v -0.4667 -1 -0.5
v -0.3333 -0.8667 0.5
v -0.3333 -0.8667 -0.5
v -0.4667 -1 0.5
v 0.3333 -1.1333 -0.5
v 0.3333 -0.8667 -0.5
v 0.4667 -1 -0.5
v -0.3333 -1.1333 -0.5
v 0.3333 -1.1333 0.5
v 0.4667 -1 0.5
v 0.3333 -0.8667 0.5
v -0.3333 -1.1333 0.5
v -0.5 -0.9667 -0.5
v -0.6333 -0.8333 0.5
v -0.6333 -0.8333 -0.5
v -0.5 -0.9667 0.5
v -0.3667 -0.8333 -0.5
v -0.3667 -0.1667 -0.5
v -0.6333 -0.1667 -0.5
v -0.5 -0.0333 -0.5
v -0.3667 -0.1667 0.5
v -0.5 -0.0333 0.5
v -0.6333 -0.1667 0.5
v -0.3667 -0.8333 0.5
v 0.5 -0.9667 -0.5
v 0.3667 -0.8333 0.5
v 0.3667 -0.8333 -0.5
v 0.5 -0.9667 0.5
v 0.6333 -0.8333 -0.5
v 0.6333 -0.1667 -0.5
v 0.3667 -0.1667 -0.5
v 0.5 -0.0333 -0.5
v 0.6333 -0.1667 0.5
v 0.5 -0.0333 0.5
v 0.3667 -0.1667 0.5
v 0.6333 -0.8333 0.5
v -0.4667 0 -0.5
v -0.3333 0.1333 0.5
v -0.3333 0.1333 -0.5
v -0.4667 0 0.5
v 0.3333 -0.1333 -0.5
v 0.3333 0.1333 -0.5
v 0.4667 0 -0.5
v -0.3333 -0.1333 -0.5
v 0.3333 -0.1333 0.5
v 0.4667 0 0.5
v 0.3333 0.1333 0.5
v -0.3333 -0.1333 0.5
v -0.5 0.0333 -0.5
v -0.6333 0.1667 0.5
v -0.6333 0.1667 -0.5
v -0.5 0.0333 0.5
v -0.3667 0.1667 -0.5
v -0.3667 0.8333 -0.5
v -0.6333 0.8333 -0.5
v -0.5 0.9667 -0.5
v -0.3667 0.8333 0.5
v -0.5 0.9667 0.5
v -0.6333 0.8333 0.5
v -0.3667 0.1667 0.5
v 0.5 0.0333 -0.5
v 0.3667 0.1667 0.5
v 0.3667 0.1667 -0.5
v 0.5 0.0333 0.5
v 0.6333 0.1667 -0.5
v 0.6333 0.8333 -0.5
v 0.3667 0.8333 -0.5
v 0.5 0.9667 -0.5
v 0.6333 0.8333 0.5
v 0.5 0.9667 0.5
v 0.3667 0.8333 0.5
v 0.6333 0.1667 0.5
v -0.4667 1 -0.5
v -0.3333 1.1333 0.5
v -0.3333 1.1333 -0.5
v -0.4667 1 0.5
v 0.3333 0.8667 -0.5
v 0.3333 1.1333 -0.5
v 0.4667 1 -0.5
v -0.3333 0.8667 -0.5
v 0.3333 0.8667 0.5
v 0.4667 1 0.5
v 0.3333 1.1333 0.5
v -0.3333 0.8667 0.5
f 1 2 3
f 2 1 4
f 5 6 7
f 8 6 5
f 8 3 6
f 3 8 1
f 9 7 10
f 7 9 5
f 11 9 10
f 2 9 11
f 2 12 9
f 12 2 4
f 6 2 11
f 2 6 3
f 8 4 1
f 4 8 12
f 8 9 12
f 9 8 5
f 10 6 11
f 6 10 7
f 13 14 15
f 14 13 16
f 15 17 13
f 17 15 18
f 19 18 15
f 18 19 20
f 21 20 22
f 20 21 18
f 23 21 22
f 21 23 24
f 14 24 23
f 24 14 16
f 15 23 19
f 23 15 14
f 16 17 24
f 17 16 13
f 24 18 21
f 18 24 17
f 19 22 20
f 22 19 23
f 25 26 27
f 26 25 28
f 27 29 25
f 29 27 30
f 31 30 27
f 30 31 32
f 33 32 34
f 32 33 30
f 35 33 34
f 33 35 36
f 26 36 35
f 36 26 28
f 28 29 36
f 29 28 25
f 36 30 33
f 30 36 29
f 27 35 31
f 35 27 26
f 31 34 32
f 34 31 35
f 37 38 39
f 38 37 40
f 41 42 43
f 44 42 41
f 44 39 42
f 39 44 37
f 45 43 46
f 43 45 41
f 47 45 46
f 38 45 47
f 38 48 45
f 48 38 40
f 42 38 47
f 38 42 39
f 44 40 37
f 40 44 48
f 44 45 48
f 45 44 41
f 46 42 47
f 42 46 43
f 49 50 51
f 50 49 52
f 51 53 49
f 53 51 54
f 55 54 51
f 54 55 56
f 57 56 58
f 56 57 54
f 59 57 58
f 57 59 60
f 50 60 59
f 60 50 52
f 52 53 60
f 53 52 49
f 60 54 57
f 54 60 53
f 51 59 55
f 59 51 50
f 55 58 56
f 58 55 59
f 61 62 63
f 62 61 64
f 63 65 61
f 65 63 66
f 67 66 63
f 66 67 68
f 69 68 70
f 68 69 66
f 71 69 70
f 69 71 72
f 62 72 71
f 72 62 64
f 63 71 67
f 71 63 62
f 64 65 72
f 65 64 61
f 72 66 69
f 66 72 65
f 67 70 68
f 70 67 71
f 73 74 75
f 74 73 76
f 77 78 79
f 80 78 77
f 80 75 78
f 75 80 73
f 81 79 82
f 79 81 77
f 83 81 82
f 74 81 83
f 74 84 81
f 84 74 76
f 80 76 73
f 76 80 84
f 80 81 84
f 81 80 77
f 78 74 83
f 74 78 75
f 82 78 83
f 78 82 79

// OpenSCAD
// file: bitops.scad
function bit(p) = pow(2,(p));
function _BTEST(x, abit) = x % (abit+abit) >= abit;
function BTEST(x, abit) = _BTEST(x, bit(abit));

function BIT(x, abit=0) = x % (bit(abit)+bit(abit)); 


//echo("5 :", BTEST(5,2), BTEST(5,1), BTEST(5,0));
//echo("5 :", BIT(5,2), BIT(5,1), BIT(5,0));

//=================================
// Bit manipulation
//=================================

function getdigit(x, pos=1) = floor(fract(x/pow(10,pos))*10);

function fract(x) = x - floor(x); 

function LSHIFT(x, pos=1, base=2) = x*pow(base,pos); 
function RSHIFT(x, pos=1, base=2) = floor(x/pow(base, pos));
function RSHIFTPART(x, pos=1, base=2) = x % pow(base, pos);
function lowbit(x, base=2) = x - LSHIFT(RSHIFT(x, base=base), base=base);

function BIT(x, pos=0, base=2) = lowbit(RSHIFT(x, pos,base), base=base);
//function BTEST(x, pos=0, base=2) = BIT(x,pos,base)>0;
// file: SegmentedNumber.scad
/*
	This module creates seven segment display digits
*/

include <bitops.scad>


joinfactor = 0.01;
gap = 0.4;
digitwidth = 1;
digitdepth = 2;
scalar = 30;


/*
	segment

	An array of 2D coordinates which define the Outline
	for a single segment of the seven segement display.

	This single segment is laid out horizontally, and is
	centered around the origin.
*/
// Outline of a single segment

segment =[ 
	[-14/scalar, 0], 
	[-10/scalar, -4/scalar], 
	[10/scalar, -4/scalar], 
	[14/scalar, 0], 
	[10/scalar, 4/scalar], 
	[-10/scalar, 4/scalar]];

/*
	seglocs

	An array of translations and rotations which places
	each segment in the proper place in the seven segment
	display.


*/
// Take the template of a segment, and give appropriate
// translations and rotations to put it in place to form a number.
// for each segment there is a tuple:
// [trans], rot
// [trans] is a triplet that indicates the translation
// rot - is the angle of rotation around the z-axis

seglocs = [
	[[0,-1.0,0], 0],
	[[-0.5,-0.5,0],90],
	[[0.5,-0.5,0],90],
	[[0,0,0],0],
	[[-0.5,0.5,0],90],
	[[0.5,0.5,0],90],
	[[0,1.0,0],0]
];

/*
Digit Information

The seven segments of the display (left), 
each have the number indicated (right)
	 __			6
	|  |	4		5
	 --			3
	|  |	1		2
	 --			0

 A single 8-bit number is used to indicate which
 segments are active for any single digit.  If a bit
 is set, then that particular segment is active.
*/

DigitSegments = [
			119,	// 0	0111 0111
			36,		// 1	0010 0100
			107,	// 2	0110 1011
			109,	// 3	0110 1101
			60,		// 4	0011 1100
			93,		// 5
			95,		// 6
			100,	// 7
			127,	// 8
			125		// 9
			];


function value(astr)=search(astr,"0123456789")[0]; 

/*
	DisplayDigit

	Display a single digit
	iNumber - the single digit to Display
	height - how tall to make it, default to '1'
*/

module DisplayDigit(iNumber, height = 1)
{        
    for (iSeg = [0:6])
	{
		if (BTEST(DigitSegments[iNumber],iSeg))
        {
			linear_extrude(height=height, center=true) {
				translate(seglocs[iSeg][0])
				rotate(seglocs[iSeg][1])
				polygon(points = segment, paths = [[0,1,2,3,4,5]]);
			}
        }
	}
}

module DisplayNumber(number, height=1)
{
	digitstr = str(number);
	count = len(digitstr);
	echo("len: ", count);

	for (counter = [0:count-1])
	{
		digitchar = digitstr[counter];
		digitvalue = value(digitchar);
		
		echo(digitchar, " ", digitvalue);
		translate([(counter)*(digitwidth+gap),0,0])
		DisplayDigit(digitvalue, height);
	}
}

module RenderNumberPlate(number, thickness=1, height=1)
{
	digitstr = str(number);
	count = len(digitstr);
	platewidth = count*(digitwidth+gap)+2*gap;
	platedepth = digitdepth+2*gap;

	DisplayNumber(number, height);

	// Display the plate
	color([0.2, 0.7, 0.3])
	translate([-digitwidth/2-gap*2, -digitdepth/2-gap, -thickness-height/2+joinfactor])
	cube(size=[platewidth, platedepth, thickness]);
}
// main file
include <SegmentedNumber.scad>

//scale([25, 25, 10])
//DisplayDigit(0);
//DisplayDigit(1);
//DisplayDigit(2);
//DisplayDigit(3);
//DisplayDigit(4);
//DisplayDigit(5);
//DisplayDigit(6);
//DisplayDigit(7);
DisplayDigit(8);
//DisplayDigit(9);

//scale([15, 15, 1])
//DisplayDigit(8, height=3);
//DisplayDigit(9, thickness=5);
